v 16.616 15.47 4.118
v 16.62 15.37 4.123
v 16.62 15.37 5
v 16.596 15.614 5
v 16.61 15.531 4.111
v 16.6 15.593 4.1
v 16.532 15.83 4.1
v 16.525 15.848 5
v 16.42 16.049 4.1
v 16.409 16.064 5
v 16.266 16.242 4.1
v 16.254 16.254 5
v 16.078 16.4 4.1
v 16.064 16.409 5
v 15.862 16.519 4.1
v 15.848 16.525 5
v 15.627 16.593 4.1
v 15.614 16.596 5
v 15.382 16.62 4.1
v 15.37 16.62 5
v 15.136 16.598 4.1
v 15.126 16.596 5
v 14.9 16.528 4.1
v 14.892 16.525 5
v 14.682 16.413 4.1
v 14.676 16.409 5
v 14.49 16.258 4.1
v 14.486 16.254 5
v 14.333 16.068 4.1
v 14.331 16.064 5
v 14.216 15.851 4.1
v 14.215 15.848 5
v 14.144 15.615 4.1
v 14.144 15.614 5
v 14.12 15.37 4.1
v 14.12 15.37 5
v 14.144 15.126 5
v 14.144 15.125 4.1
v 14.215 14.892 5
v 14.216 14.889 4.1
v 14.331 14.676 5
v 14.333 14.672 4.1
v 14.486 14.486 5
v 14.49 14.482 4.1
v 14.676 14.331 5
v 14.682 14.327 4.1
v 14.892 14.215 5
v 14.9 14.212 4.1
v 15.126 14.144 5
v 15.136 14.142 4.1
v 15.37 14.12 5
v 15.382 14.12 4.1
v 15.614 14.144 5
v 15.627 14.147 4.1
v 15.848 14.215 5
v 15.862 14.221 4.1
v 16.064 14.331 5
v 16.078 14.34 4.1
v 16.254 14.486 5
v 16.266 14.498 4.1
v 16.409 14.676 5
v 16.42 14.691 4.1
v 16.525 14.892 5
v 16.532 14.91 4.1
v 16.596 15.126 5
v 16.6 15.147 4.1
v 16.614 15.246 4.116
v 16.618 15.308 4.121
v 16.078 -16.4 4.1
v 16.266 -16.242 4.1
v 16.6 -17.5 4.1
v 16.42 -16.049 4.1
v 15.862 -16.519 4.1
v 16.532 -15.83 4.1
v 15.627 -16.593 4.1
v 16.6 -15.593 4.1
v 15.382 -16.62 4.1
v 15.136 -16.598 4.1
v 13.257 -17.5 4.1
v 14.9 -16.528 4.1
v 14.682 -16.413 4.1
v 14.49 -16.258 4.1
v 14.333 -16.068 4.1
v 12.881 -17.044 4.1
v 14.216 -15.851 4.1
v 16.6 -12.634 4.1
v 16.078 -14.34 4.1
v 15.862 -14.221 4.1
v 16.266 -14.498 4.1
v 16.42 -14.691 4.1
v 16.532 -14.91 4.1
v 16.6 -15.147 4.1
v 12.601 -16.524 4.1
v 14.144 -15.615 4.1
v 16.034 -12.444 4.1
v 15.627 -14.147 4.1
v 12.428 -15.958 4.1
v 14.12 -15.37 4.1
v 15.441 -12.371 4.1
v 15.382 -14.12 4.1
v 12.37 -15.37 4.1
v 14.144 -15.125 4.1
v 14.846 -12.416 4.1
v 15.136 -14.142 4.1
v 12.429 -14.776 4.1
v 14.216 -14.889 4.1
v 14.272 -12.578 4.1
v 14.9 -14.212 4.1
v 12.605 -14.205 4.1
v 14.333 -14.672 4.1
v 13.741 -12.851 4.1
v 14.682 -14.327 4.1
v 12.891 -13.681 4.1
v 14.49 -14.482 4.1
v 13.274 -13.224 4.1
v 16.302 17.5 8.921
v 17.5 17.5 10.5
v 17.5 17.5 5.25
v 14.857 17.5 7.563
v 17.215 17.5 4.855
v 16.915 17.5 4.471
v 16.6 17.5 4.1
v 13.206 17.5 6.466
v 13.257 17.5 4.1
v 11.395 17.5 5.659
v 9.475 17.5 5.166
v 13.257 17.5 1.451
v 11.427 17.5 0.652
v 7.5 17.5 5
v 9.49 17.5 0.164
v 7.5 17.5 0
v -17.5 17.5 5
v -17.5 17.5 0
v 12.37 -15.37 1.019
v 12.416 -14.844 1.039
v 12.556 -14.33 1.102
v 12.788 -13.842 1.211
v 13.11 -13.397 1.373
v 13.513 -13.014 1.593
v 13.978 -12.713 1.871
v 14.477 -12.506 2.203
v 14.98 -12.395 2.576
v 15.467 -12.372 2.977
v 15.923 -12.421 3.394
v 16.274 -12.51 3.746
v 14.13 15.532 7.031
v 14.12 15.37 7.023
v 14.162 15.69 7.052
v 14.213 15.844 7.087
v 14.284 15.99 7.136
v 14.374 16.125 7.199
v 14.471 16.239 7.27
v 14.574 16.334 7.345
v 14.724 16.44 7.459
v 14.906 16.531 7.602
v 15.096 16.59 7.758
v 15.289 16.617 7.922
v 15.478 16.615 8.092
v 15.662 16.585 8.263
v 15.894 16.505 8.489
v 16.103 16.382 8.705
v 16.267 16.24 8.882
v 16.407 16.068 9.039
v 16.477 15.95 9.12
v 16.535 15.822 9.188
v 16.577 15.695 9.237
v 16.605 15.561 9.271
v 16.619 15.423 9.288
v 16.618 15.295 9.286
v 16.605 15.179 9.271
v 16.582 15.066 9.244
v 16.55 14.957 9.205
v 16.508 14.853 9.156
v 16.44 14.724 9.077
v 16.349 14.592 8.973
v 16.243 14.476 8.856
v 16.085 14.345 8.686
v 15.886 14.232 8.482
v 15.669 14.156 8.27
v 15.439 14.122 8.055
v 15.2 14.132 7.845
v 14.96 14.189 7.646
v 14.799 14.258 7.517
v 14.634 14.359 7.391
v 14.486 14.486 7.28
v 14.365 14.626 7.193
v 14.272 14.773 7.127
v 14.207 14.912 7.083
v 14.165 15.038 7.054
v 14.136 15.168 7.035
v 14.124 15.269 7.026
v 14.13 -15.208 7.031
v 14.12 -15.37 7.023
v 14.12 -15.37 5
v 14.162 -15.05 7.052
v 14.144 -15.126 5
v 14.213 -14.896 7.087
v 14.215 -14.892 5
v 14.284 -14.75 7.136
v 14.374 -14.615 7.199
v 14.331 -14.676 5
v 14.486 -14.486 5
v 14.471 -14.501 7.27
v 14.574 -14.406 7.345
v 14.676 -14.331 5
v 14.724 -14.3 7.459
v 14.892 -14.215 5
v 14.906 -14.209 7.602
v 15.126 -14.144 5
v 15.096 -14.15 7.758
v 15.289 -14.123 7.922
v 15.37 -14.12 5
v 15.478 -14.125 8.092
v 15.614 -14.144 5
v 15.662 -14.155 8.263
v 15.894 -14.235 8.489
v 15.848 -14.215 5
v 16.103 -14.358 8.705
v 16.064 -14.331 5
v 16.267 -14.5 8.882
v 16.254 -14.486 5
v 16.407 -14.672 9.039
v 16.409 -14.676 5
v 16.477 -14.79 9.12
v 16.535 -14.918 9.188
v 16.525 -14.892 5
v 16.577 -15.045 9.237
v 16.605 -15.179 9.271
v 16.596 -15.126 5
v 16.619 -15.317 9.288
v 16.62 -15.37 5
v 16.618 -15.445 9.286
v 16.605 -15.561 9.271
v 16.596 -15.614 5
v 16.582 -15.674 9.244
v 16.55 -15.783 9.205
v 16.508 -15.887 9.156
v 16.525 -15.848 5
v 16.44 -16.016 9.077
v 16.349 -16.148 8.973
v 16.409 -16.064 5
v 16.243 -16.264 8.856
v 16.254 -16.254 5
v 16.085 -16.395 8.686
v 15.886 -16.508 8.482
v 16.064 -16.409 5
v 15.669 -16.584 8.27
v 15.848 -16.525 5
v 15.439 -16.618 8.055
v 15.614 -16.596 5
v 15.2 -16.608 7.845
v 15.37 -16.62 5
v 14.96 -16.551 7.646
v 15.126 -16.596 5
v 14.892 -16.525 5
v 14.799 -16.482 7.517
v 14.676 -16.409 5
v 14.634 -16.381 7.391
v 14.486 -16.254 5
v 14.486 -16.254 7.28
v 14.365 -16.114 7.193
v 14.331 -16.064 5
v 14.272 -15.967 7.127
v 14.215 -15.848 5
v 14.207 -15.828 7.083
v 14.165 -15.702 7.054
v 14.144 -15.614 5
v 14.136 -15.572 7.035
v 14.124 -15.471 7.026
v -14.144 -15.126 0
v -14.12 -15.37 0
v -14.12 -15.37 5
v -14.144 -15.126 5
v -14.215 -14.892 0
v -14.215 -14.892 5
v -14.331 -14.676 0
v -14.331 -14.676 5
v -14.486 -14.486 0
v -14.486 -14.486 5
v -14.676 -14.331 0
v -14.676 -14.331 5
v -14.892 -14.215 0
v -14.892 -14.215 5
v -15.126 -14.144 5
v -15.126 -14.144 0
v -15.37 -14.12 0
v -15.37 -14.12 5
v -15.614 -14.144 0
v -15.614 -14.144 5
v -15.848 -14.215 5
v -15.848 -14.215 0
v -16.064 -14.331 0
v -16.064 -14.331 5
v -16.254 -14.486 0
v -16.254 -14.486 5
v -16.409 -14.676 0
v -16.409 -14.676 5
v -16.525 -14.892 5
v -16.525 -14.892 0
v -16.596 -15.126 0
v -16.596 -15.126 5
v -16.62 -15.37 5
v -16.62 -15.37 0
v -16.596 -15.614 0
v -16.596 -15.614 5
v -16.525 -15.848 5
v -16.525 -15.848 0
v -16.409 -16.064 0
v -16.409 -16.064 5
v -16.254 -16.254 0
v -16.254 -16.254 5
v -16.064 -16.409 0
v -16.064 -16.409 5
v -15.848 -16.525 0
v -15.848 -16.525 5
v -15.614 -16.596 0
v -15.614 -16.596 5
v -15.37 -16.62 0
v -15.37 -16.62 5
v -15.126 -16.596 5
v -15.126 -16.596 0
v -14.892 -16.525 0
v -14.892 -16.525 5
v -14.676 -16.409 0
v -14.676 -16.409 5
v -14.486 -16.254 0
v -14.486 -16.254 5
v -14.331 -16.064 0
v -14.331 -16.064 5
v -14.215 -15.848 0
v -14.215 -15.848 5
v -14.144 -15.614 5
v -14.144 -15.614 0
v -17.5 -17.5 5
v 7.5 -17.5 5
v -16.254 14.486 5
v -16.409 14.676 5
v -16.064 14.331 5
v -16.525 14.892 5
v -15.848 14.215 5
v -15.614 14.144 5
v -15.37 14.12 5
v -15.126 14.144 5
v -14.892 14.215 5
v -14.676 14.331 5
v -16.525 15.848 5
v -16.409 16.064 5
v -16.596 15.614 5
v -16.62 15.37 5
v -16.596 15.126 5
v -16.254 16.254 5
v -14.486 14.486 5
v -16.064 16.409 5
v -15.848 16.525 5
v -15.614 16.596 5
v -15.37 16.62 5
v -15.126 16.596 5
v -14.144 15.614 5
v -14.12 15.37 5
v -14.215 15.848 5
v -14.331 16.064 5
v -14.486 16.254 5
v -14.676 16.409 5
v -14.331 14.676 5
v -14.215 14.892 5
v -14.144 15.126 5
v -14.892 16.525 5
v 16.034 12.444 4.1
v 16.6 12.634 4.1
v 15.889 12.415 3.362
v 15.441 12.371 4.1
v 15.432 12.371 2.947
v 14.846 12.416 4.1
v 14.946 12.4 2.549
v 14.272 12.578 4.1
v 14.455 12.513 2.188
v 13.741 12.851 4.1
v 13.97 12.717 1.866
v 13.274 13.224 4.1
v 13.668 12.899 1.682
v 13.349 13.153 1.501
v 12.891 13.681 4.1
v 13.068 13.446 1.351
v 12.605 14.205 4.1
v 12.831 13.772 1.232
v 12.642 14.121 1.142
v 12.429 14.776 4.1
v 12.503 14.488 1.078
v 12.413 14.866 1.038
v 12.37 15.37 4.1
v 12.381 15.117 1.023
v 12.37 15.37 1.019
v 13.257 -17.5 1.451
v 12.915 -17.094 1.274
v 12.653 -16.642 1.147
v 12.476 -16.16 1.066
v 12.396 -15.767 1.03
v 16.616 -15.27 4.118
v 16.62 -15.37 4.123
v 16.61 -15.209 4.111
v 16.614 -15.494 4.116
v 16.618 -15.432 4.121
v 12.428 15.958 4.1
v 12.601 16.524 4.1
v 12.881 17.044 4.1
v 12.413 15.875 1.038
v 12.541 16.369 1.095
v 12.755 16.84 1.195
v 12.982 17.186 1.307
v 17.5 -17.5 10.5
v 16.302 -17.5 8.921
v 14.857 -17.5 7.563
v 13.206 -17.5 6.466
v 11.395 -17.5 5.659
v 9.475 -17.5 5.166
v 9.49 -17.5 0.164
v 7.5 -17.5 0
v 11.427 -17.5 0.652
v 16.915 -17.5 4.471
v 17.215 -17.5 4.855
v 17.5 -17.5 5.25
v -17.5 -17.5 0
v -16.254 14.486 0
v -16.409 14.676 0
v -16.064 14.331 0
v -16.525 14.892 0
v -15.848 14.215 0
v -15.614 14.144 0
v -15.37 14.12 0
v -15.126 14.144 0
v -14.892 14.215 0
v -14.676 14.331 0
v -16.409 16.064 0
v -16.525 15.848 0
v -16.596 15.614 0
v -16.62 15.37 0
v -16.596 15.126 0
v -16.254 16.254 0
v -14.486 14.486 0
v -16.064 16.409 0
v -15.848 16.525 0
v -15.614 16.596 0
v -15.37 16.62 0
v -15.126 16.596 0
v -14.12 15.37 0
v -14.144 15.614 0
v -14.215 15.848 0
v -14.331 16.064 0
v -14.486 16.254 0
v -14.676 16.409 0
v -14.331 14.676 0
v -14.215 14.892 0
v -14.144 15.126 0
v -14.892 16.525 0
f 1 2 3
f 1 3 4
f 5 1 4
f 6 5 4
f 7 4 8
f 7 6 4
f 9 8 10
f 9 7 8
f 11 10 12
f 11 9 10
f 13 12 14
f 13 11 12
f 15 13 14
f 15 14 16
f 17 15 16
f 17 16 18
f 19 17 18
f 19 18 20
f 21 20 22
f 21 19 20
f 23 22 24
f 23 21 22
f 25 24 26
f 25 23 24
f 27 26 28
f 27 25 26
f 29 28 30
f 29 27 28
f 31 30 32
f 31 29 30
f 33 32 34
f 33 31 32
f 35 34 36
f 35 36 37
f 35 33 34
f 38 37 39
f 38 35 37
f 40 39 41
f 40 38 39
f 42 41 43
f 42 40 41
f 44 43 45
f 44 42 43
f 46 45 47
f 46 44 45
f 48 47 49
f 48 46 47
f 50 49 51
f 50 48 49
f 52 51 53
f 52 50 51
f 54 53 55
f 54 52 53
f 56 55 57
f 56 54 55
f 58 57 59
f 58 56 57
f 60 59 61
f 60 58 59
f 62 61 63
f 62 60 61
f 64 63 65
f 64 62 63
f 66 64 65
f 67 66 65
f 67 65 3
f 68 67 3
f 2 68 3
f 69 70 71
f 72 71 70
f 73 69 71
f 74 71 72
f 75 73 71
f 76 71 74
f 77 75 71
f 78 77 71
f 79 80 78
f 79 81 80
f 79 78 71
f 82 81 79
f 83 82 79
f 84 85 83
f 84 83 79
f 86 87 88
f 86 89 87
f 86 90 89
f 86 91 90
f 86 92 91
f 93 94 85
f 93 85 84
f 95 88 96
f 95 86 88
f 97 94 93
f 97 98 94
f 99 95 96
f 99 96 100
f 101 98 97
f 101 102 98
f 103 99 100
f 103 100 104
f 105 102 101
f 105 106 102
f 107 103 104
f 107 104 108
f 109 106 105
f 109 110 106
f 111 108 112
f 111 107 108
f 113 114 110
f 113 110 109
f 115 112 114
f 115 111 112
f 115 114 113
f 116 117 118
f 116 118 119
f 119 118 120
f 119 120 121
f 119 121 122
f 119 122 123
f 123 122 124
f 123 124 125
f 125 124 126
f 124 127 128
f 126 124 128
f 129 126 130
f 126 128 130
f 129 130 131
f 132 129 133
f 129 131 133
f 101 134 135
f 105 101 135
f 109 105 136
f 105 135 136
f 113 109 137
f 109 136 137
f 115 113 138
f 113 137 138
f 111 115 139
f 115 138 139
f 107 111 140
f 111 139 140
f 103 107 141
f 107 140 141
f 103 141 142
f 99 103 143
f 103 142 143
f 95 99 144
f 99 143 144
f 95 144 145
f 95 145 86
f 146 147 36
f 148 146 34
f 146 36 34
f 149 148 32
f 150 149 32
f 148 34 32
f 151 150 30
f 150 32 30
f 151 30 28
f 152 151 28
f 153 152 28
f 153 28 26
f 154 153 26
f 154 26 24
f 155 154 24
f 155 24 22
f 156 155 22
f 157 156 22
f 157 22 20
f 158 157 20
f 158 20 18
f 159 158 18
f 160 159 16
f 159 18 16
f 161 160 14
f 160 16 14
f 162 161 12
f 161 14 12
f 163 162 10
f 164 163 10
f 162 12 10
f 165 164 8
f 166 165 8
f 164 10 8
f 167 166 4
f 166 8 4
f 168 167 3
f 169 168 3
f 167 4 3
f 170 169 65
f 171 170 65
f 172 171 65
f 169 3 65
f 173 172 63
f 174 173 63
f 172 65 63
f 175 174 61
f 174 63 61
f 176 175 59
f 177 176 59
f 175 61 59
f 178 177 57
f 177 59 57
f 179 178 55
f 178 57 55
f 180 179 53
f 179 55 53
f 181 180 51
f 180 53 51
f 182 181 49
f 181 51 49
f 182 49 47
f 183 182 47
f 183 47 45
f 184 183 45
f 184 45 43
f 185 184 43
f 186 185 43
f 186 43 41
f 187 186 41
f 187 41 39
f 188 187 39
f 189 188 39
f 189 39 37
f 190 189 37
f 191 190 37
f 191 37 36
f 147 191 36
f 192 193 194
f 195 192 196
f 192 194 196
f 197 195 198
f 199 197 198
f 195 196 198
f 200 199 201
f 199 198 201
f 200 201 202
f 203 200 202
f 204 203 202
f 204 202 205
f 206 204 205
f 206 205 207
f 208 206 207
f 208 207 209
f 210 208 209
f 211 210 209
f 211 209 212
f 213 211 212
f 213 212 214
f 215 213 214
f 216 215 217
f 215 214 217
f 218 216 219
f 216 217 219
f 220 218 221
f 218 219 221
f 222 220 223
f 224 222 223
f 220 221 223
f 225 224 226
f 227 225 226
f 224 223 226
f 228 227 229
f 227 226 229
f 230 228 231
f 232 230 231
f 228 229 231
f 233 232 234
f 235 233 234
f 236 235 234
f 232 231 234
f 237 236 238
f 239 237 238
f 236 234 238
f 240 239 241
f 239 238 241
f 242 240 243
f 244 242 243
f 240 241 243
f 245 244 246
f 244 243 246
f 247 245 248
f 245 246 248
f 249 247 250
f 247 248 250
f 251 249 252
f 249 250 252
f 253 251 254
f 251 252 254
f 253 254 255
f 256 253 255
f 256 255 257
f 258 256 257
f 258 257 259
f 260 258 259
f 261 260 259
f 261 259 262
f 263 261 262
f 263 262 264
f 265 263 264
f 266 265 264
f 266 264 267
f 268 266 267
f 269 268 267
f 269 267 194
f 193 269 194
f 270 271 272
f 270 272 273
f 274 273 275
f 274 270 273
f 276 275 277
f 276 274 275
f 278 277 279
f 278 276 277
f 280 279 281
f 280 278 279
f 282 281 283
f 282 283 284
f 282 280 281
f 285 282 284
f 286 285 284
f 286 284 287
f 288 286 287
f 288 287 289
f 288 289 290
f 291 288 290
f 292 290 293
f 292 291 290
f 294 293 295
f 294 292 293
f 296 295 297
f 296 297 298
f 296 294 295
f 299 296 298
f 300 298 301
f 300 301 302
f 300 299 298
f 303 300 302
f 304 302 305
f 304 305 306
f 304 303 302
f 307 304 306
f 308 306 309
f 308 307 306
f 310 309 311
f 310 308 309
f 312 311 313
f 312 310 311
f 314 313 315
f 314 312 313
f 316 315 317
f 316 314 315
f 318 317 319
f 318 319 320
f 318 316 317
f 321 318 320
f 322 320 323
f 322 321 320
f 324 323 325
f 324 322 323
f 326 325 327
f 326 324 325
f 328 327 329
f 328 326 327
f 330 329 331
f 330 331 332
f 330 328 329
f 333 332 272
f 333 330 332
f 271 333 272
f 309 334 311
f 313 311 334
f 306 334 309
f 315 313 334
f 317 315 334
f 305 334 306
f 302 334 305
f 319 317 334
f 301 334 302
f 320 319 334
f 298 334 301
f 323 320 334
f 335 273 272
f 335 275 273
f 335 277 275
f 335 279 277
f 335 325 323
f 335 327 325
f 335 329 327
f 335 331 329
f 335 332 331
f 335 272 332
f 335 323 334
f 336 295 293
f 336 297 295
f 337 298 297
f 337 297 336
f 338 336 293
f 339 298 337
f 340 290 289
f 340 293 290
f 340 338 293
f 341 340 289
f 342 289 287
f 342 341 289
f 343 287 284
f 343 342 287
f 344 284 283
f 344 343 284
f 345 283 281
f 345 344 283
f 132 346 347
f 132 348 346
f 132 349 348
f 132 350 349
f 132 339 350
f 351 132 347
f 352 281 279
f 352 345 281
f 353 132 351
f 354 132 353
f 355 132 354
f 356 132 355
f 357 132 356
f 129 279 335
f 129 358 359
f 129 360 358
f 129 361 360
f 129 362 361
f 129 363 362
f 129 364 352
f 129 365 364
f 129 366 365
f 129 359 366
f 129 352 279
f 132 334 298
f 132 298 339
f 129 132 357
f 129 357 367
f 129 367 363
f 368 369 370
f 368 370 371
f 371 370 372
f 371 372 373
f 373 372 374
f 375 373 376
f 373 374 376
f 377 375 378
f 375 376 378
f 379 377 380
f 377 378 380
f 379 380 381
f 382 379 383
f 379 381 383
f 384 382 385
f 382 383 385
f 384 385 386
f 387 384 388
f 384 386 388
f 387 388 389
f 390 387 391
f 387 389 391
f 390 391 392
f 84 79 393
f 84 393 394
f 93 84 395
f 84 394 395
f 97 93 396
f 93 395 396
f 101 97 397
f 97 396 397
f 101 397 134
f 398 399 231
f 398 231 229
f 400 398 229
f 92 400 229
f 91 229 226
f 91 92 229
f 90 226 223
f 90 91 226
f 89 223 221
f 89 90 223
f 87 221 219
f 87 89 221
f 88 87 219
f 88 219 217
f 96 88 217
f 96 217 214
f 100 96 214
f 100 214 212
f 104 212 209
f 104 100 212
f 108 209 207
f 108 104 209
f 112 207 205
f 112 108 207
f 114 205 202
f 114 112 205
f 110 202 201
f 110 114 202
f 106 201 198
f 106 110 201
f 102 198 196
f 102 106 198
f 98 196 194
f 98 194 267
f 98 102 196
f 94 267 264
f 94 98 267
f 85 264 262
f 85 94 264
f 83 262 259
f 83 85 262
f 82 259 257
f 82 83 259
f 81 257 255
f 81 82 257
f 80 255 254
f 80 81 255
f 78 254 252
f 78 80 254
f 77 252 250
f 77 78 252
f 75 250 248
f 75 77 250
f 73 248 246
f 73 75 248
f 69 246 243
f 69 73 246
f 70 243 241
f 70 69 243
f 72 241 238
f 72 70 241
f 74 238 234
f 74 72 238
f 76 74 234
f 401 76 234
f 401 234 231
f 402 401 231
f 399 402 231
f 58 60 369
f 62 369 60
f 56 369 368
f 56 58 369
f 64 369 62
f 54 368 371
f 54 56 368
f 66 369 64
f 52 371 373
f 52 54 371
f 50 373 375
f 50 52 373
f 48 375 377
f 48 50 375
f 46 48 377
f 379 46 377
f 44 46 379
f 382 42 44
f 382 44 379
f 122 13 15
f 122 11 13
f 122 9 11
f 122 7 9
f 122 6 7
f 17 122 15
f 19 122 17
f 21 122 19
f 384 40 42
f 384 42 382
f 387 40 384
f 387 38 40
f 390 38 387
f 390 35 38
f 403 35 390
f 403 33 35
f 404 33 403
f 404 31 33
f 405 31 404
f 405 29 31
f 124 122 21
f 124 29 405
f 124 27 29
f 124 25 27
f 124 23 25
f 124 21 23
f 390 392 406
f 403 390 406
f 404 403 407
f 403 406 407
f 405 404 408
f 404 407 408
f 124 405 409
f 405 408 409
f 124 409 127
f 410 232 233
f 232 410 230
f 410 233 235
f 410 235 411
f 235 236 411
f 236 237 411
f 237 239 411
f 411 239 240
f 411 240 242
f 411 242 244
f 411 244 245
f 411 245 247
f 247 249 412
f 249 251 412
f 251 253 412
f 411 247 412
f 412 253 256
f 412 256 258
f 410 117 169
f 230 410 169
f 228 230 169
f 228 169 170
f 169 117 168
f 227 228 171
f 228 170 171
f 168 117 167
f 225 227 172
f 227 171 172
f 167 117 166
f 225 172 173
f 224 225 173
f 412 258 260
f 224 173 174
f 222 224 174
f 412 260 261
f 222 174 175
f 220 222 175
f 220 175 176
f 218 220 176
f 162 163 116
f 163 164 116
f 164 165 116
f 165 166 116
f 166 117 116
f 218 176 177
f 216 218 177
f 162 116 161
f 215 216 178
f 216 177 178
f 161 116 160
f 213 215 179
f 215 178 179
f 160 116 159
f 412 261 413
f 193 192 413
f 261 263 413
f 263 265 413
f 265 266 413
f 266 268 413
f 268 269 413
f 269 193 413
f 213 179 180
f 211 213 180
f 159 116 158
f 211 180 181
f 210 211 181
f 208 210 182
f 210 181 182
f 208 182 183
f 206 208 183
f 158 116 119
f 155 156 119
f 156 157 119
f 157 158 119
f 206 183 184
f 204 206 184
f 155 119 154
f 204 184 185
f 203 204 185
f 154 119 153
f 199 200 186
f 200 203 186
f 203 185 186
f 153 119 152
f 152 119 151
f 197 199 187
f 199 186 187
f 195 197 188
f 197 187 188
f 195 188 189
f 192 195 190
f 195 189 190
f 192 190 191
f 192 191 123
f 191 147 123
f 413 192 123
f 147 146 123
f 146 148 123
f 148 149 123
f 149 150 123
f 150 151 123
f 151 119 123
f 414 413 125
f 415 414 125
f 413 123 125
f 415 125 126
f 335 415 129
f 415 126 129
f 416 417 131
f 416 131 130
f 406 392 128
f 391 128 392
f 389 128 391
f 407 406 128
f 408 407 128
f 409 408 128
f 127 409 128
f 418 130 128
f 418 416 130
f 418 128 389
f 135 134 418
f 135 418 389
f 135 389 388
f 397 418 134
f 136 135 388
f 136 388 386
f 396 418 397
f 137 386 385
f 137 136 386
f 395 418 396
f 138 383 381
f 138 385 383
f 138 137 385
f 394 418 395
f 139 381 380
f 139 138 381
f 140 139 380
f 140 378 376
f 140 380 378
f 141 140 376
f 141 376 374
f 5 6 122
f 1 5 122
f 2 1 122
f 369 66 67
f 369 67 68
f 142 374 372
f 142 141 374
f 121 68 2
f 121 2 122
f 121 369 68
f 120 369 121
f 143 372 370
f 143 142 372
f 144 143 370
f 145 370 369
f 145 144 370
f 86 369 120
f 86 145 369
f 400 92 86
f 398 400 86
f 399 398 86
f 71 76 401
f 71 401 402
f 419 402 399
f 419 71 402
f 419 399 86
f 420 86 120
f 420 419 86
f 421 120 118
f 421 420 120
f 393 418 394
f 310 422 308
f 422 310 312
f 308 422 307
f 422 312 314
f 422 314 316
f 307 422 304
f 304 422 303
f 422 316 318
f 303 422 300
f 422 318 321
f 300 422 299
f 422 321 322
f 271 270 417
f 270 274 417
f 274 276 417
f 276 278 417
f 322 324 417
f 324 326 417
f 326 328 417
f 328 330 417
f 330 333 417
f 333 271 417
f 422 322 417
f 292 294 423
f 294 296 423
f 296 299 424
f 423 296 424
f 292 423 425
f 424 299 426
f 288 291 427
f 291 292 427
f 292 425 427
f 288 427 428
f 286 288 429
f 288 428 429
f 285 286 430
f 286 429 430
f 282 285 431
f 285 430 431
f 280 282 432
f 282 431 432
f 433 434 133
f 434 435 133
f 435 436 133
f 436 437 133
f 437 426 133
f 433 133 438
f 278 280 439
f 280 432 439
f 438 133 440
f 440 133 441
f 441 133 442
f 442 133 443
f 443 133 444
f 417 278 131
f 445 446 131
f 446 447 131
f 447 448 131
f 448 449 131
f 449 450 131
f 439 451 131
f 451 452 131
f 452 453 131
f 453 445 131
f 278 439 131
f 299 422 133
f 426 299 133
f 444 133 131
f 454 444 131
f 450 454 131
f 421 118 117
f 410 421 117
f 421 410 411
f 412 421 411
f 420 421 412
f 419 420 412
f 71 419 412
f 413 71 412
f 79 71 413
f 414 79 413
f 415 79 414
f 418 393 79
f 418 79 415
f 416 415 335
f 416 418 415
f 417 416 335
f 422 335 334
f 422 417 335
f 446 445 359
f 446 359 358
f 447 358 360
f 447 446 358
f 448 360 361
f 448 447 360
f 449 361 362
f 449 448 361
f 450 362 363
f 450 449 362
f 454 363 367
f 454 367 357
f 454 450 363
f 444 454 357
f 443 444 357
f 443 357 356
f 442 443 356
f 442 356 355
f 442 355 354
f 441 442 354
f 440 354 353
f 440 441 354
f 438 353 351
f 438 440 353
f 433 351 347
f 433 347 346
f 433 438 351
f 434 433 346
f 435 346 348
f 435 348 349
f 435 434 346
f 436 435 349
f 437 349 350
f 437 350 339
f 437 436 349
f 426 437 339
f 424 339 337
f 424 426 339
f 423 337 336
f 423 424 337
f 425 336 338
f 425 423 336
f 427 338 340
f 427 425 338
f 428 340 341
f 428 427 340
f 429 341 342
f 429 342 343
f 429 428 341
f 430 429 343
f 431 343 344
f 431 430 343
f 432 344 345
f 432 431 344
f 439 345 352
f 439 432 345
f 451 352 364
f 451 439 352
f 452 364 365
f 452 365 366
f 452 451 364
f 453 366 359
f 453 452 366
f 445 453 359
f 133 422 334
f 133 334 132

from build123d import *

# Parameters (mm, degrees)
CROQUIS1_W                 = 35
CROQUIS1_H                 = 35
CROQUIS1_R                 = 1.25
SALIENTE_EXTRUIR1_DEPTH    = 5
SALIENTE_EXTRUIR2_DEPTH    = 35
CORTAR_EXTRUIR2_DEPTH      = 41.51542916
CORTAR_EXTRUIR2_DEPTH_BACK = 41.51542916
CROQUIS4_R                 = 1.25
CORTAR_EXTRUIR3_DEPTH      = 10
CROQUIS5_R                 = 3
CORTAR_EXTRUIR6_DEPTH      = 4.1


with BuildPart() as part:
    # Croquis1 → Saliente-Extruir1 (new body)
    with BuildSketch(Plane.XY):
        Rectangle(CROQUIS1_W, CROQUIS1_H)
        with Locations((15.37, -15.37)):
            Circle(CROQUIS1_R, mode=Mode.SUBTRACT)
        with Locations((-15.37, -15.37)):
            Circle(CROQUIS1_R, mode=Mode.SUBTRACT)
        with Locations((-15.37, 15.37)):
            Circle(CROQUIS1_R, mode=Mode.SUBTRACT)
        with Locations((15.37, 15.37)):
            Circle(CROQUIS1_R, mode=Mode.SUBTRACT)
    extrude(amount=SALIENTE_EXTRUIR1_DEPTH)

    # Croquis2 → Saliente-Extruir2 (add, through all)
    with BuildSketch(Plane(origin=(0, 17.5, 0), x_dir=(1, 0, 0), z_dir=(0, 1, 0))):
        with BuildLine():
            Line((17.5, -5), (17.5, -10.5))
            ThreePointArc((17.5, -10.5), (13.206356105, -6.465716172), (7.5, -5))
            Line((7.5, -5), (17.5, -5))
        make_face()
    extrude(amount=-SALIENTE_EXTRUIR2_DEPTH)

    # Croquis3 → Cortar-Extruir2 (cut, two sides: drawn at the far end of the back side and taken through both)
    with BuildSketch(Plane(origin=(0, 17.5, 0), x_dir=(1, 0, 0), z_dir=(0, 1, 0)).offset(-CORTAR_EXTRUIR2_DEPTH_BACK)):
        with BuildLine():
            Line((17.5, 0), (7.5, 0))
            ThreePointArc((7.5, 0), (13.147178499, -1.392279049), (17.5, -5.25))
            Line((17.5, -5.25), (17.5, 0))
        make_face()
    extrude(amount=CORTAR_EXTRUIR2_DEPTH + CORTAR_EXTRUIR2_DEPTH_BACK, mode=Mode.SUBTRACT)

    # Croquis4 → Cortar-Extruir3 (cut)
    with BuildSketch(Plane(origin=(0, 0, 5), x_dir=(-1, 0, 0), z_dir=(0, 0, -1))):
        with Locations((-15.37, 15.37)):
            Circle(CROQUIS4_R)
        with Locations((-15.37, -15.37)):
            Circle(CROQUIS4_R)
    extrude(amount=-CORTAR_EXTRUIR3_DEPTH, mode=Mode.SUBTRACT)

    # Croquis5 → Cortar-Extruir6 (cut)
    with BuildSketch(Plane(origin=(0, 0, 0), x_dir=(-1, 0, 0), z_dir=(0, 0, -1))):
        with Locations((-15.37, 15.37)):
            Circle(CROQUIS5_R)
        with Locations((-15.37, -15.37)):
            Circle(CROQUIS5_R)
    extrude(amount=-CORTAR_EXTRUIR6_DEPTH, mode=Mode.SUBTRACT)


solid = part.part
